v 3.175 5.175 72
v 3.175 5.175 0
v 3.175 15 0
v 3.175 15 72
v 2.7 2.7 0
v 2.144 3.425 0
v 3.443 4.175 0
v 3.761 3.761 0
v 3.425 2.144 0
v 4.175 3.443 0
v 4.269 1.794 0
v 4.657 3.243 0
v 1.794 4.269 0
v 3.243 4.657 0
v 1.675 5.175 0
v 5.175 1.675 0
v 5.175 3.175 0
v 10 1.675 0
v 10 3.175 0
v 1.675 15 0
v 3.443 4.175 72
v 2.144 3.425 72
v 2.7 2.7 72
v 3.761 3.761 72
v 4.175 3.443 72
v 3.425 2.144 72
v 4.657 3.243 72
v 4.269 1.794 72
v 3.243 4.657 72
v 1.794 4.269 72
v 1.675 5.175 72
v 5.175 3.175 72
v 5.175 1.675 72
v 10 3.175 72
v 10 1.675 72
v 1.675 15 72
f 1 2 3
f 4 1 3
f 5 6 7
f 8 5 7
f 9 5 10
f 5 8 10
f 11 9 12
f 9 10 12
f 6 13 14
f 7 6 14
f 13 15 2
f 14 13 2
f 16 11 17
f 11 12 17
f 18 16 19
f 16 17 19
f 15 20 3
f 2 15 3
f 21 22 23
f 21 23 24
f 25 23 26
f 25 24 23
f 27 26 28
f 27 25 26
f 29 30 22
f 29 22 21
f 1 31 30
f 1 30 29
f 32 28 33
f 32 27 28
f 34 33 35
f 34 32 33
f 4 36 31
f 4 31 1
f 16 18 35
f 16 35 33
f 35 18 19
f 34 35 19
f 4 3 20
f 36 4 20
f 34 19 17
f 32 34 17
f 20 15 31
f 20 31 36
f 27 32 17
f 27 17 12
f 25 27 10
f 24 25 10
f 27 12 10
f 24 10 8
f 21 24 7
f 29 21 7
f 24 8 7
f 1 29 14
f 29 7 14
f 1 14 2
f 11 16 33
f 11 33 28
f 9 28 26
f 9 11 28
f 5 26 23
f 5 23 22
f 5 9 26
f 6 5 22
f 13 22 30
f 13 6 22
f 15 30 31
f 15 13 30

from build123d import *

# Parameters (mm, degrees)
BOSS_EXTRUDE1_DEPTH    = 72
CONVERT_SOLID1_DEPTH   = 72
CONVERT_SOLID1_2_DEPTH = 72


# Read off the part's stored shape, not the designer's step: Convert-Solid1
with BuildPart() as part:
    # Sketch1 → Boss-Extrude1 (new body)
    with BuildSketch(Plane.XY):
        Polygon((0, 15), (0, 0), (10, 0), (10, 3.175), (3.175, 3.175), (3.175, 15), align=None)
    extrude(amount=BOSS_EXTRUDE1_DEPTH)

    # Convert-Solid1 outline → Convert-Solid1 (cut)
    with BuildSketch(Plane.XY):
        with BuildLine():
            Line((1.675, 5.175), (1.675, 15))
            Line((1.675, 15), (0, 15))
            Line((0, 15), (0, 0))
            Line((0, 0), (10, 0))
            Line((10, 0), (10, 1.675))
            Line((10, 1.675), (5.175, 1.675))
            ThreePointArc((5.175, 1.675), (2.700126266, 2.700126266), (1.675, 5.175))
        make_face()
    extrude(amount=CONVERT_SOLID1_DEPTH, mode=Mode.SUBTRACT)

    # Convert-Solid1 2 outline → Convert-Solid1 2 (add)
    with BuildSketch(Plane.XY):
        with BuildLine():
            ThreePointArc((5.175, 3.175), (3.760786438, 3.760786438), (3.175, 5.175))
            Line((3.175, 5.175), (3.175, 3.175))
            Line((3.175, 3.175), (5.175, 3.175))
        make_face()
    extrude(amount=CONVERT_SOLID1_2_DEPTH)


solid = part.part
